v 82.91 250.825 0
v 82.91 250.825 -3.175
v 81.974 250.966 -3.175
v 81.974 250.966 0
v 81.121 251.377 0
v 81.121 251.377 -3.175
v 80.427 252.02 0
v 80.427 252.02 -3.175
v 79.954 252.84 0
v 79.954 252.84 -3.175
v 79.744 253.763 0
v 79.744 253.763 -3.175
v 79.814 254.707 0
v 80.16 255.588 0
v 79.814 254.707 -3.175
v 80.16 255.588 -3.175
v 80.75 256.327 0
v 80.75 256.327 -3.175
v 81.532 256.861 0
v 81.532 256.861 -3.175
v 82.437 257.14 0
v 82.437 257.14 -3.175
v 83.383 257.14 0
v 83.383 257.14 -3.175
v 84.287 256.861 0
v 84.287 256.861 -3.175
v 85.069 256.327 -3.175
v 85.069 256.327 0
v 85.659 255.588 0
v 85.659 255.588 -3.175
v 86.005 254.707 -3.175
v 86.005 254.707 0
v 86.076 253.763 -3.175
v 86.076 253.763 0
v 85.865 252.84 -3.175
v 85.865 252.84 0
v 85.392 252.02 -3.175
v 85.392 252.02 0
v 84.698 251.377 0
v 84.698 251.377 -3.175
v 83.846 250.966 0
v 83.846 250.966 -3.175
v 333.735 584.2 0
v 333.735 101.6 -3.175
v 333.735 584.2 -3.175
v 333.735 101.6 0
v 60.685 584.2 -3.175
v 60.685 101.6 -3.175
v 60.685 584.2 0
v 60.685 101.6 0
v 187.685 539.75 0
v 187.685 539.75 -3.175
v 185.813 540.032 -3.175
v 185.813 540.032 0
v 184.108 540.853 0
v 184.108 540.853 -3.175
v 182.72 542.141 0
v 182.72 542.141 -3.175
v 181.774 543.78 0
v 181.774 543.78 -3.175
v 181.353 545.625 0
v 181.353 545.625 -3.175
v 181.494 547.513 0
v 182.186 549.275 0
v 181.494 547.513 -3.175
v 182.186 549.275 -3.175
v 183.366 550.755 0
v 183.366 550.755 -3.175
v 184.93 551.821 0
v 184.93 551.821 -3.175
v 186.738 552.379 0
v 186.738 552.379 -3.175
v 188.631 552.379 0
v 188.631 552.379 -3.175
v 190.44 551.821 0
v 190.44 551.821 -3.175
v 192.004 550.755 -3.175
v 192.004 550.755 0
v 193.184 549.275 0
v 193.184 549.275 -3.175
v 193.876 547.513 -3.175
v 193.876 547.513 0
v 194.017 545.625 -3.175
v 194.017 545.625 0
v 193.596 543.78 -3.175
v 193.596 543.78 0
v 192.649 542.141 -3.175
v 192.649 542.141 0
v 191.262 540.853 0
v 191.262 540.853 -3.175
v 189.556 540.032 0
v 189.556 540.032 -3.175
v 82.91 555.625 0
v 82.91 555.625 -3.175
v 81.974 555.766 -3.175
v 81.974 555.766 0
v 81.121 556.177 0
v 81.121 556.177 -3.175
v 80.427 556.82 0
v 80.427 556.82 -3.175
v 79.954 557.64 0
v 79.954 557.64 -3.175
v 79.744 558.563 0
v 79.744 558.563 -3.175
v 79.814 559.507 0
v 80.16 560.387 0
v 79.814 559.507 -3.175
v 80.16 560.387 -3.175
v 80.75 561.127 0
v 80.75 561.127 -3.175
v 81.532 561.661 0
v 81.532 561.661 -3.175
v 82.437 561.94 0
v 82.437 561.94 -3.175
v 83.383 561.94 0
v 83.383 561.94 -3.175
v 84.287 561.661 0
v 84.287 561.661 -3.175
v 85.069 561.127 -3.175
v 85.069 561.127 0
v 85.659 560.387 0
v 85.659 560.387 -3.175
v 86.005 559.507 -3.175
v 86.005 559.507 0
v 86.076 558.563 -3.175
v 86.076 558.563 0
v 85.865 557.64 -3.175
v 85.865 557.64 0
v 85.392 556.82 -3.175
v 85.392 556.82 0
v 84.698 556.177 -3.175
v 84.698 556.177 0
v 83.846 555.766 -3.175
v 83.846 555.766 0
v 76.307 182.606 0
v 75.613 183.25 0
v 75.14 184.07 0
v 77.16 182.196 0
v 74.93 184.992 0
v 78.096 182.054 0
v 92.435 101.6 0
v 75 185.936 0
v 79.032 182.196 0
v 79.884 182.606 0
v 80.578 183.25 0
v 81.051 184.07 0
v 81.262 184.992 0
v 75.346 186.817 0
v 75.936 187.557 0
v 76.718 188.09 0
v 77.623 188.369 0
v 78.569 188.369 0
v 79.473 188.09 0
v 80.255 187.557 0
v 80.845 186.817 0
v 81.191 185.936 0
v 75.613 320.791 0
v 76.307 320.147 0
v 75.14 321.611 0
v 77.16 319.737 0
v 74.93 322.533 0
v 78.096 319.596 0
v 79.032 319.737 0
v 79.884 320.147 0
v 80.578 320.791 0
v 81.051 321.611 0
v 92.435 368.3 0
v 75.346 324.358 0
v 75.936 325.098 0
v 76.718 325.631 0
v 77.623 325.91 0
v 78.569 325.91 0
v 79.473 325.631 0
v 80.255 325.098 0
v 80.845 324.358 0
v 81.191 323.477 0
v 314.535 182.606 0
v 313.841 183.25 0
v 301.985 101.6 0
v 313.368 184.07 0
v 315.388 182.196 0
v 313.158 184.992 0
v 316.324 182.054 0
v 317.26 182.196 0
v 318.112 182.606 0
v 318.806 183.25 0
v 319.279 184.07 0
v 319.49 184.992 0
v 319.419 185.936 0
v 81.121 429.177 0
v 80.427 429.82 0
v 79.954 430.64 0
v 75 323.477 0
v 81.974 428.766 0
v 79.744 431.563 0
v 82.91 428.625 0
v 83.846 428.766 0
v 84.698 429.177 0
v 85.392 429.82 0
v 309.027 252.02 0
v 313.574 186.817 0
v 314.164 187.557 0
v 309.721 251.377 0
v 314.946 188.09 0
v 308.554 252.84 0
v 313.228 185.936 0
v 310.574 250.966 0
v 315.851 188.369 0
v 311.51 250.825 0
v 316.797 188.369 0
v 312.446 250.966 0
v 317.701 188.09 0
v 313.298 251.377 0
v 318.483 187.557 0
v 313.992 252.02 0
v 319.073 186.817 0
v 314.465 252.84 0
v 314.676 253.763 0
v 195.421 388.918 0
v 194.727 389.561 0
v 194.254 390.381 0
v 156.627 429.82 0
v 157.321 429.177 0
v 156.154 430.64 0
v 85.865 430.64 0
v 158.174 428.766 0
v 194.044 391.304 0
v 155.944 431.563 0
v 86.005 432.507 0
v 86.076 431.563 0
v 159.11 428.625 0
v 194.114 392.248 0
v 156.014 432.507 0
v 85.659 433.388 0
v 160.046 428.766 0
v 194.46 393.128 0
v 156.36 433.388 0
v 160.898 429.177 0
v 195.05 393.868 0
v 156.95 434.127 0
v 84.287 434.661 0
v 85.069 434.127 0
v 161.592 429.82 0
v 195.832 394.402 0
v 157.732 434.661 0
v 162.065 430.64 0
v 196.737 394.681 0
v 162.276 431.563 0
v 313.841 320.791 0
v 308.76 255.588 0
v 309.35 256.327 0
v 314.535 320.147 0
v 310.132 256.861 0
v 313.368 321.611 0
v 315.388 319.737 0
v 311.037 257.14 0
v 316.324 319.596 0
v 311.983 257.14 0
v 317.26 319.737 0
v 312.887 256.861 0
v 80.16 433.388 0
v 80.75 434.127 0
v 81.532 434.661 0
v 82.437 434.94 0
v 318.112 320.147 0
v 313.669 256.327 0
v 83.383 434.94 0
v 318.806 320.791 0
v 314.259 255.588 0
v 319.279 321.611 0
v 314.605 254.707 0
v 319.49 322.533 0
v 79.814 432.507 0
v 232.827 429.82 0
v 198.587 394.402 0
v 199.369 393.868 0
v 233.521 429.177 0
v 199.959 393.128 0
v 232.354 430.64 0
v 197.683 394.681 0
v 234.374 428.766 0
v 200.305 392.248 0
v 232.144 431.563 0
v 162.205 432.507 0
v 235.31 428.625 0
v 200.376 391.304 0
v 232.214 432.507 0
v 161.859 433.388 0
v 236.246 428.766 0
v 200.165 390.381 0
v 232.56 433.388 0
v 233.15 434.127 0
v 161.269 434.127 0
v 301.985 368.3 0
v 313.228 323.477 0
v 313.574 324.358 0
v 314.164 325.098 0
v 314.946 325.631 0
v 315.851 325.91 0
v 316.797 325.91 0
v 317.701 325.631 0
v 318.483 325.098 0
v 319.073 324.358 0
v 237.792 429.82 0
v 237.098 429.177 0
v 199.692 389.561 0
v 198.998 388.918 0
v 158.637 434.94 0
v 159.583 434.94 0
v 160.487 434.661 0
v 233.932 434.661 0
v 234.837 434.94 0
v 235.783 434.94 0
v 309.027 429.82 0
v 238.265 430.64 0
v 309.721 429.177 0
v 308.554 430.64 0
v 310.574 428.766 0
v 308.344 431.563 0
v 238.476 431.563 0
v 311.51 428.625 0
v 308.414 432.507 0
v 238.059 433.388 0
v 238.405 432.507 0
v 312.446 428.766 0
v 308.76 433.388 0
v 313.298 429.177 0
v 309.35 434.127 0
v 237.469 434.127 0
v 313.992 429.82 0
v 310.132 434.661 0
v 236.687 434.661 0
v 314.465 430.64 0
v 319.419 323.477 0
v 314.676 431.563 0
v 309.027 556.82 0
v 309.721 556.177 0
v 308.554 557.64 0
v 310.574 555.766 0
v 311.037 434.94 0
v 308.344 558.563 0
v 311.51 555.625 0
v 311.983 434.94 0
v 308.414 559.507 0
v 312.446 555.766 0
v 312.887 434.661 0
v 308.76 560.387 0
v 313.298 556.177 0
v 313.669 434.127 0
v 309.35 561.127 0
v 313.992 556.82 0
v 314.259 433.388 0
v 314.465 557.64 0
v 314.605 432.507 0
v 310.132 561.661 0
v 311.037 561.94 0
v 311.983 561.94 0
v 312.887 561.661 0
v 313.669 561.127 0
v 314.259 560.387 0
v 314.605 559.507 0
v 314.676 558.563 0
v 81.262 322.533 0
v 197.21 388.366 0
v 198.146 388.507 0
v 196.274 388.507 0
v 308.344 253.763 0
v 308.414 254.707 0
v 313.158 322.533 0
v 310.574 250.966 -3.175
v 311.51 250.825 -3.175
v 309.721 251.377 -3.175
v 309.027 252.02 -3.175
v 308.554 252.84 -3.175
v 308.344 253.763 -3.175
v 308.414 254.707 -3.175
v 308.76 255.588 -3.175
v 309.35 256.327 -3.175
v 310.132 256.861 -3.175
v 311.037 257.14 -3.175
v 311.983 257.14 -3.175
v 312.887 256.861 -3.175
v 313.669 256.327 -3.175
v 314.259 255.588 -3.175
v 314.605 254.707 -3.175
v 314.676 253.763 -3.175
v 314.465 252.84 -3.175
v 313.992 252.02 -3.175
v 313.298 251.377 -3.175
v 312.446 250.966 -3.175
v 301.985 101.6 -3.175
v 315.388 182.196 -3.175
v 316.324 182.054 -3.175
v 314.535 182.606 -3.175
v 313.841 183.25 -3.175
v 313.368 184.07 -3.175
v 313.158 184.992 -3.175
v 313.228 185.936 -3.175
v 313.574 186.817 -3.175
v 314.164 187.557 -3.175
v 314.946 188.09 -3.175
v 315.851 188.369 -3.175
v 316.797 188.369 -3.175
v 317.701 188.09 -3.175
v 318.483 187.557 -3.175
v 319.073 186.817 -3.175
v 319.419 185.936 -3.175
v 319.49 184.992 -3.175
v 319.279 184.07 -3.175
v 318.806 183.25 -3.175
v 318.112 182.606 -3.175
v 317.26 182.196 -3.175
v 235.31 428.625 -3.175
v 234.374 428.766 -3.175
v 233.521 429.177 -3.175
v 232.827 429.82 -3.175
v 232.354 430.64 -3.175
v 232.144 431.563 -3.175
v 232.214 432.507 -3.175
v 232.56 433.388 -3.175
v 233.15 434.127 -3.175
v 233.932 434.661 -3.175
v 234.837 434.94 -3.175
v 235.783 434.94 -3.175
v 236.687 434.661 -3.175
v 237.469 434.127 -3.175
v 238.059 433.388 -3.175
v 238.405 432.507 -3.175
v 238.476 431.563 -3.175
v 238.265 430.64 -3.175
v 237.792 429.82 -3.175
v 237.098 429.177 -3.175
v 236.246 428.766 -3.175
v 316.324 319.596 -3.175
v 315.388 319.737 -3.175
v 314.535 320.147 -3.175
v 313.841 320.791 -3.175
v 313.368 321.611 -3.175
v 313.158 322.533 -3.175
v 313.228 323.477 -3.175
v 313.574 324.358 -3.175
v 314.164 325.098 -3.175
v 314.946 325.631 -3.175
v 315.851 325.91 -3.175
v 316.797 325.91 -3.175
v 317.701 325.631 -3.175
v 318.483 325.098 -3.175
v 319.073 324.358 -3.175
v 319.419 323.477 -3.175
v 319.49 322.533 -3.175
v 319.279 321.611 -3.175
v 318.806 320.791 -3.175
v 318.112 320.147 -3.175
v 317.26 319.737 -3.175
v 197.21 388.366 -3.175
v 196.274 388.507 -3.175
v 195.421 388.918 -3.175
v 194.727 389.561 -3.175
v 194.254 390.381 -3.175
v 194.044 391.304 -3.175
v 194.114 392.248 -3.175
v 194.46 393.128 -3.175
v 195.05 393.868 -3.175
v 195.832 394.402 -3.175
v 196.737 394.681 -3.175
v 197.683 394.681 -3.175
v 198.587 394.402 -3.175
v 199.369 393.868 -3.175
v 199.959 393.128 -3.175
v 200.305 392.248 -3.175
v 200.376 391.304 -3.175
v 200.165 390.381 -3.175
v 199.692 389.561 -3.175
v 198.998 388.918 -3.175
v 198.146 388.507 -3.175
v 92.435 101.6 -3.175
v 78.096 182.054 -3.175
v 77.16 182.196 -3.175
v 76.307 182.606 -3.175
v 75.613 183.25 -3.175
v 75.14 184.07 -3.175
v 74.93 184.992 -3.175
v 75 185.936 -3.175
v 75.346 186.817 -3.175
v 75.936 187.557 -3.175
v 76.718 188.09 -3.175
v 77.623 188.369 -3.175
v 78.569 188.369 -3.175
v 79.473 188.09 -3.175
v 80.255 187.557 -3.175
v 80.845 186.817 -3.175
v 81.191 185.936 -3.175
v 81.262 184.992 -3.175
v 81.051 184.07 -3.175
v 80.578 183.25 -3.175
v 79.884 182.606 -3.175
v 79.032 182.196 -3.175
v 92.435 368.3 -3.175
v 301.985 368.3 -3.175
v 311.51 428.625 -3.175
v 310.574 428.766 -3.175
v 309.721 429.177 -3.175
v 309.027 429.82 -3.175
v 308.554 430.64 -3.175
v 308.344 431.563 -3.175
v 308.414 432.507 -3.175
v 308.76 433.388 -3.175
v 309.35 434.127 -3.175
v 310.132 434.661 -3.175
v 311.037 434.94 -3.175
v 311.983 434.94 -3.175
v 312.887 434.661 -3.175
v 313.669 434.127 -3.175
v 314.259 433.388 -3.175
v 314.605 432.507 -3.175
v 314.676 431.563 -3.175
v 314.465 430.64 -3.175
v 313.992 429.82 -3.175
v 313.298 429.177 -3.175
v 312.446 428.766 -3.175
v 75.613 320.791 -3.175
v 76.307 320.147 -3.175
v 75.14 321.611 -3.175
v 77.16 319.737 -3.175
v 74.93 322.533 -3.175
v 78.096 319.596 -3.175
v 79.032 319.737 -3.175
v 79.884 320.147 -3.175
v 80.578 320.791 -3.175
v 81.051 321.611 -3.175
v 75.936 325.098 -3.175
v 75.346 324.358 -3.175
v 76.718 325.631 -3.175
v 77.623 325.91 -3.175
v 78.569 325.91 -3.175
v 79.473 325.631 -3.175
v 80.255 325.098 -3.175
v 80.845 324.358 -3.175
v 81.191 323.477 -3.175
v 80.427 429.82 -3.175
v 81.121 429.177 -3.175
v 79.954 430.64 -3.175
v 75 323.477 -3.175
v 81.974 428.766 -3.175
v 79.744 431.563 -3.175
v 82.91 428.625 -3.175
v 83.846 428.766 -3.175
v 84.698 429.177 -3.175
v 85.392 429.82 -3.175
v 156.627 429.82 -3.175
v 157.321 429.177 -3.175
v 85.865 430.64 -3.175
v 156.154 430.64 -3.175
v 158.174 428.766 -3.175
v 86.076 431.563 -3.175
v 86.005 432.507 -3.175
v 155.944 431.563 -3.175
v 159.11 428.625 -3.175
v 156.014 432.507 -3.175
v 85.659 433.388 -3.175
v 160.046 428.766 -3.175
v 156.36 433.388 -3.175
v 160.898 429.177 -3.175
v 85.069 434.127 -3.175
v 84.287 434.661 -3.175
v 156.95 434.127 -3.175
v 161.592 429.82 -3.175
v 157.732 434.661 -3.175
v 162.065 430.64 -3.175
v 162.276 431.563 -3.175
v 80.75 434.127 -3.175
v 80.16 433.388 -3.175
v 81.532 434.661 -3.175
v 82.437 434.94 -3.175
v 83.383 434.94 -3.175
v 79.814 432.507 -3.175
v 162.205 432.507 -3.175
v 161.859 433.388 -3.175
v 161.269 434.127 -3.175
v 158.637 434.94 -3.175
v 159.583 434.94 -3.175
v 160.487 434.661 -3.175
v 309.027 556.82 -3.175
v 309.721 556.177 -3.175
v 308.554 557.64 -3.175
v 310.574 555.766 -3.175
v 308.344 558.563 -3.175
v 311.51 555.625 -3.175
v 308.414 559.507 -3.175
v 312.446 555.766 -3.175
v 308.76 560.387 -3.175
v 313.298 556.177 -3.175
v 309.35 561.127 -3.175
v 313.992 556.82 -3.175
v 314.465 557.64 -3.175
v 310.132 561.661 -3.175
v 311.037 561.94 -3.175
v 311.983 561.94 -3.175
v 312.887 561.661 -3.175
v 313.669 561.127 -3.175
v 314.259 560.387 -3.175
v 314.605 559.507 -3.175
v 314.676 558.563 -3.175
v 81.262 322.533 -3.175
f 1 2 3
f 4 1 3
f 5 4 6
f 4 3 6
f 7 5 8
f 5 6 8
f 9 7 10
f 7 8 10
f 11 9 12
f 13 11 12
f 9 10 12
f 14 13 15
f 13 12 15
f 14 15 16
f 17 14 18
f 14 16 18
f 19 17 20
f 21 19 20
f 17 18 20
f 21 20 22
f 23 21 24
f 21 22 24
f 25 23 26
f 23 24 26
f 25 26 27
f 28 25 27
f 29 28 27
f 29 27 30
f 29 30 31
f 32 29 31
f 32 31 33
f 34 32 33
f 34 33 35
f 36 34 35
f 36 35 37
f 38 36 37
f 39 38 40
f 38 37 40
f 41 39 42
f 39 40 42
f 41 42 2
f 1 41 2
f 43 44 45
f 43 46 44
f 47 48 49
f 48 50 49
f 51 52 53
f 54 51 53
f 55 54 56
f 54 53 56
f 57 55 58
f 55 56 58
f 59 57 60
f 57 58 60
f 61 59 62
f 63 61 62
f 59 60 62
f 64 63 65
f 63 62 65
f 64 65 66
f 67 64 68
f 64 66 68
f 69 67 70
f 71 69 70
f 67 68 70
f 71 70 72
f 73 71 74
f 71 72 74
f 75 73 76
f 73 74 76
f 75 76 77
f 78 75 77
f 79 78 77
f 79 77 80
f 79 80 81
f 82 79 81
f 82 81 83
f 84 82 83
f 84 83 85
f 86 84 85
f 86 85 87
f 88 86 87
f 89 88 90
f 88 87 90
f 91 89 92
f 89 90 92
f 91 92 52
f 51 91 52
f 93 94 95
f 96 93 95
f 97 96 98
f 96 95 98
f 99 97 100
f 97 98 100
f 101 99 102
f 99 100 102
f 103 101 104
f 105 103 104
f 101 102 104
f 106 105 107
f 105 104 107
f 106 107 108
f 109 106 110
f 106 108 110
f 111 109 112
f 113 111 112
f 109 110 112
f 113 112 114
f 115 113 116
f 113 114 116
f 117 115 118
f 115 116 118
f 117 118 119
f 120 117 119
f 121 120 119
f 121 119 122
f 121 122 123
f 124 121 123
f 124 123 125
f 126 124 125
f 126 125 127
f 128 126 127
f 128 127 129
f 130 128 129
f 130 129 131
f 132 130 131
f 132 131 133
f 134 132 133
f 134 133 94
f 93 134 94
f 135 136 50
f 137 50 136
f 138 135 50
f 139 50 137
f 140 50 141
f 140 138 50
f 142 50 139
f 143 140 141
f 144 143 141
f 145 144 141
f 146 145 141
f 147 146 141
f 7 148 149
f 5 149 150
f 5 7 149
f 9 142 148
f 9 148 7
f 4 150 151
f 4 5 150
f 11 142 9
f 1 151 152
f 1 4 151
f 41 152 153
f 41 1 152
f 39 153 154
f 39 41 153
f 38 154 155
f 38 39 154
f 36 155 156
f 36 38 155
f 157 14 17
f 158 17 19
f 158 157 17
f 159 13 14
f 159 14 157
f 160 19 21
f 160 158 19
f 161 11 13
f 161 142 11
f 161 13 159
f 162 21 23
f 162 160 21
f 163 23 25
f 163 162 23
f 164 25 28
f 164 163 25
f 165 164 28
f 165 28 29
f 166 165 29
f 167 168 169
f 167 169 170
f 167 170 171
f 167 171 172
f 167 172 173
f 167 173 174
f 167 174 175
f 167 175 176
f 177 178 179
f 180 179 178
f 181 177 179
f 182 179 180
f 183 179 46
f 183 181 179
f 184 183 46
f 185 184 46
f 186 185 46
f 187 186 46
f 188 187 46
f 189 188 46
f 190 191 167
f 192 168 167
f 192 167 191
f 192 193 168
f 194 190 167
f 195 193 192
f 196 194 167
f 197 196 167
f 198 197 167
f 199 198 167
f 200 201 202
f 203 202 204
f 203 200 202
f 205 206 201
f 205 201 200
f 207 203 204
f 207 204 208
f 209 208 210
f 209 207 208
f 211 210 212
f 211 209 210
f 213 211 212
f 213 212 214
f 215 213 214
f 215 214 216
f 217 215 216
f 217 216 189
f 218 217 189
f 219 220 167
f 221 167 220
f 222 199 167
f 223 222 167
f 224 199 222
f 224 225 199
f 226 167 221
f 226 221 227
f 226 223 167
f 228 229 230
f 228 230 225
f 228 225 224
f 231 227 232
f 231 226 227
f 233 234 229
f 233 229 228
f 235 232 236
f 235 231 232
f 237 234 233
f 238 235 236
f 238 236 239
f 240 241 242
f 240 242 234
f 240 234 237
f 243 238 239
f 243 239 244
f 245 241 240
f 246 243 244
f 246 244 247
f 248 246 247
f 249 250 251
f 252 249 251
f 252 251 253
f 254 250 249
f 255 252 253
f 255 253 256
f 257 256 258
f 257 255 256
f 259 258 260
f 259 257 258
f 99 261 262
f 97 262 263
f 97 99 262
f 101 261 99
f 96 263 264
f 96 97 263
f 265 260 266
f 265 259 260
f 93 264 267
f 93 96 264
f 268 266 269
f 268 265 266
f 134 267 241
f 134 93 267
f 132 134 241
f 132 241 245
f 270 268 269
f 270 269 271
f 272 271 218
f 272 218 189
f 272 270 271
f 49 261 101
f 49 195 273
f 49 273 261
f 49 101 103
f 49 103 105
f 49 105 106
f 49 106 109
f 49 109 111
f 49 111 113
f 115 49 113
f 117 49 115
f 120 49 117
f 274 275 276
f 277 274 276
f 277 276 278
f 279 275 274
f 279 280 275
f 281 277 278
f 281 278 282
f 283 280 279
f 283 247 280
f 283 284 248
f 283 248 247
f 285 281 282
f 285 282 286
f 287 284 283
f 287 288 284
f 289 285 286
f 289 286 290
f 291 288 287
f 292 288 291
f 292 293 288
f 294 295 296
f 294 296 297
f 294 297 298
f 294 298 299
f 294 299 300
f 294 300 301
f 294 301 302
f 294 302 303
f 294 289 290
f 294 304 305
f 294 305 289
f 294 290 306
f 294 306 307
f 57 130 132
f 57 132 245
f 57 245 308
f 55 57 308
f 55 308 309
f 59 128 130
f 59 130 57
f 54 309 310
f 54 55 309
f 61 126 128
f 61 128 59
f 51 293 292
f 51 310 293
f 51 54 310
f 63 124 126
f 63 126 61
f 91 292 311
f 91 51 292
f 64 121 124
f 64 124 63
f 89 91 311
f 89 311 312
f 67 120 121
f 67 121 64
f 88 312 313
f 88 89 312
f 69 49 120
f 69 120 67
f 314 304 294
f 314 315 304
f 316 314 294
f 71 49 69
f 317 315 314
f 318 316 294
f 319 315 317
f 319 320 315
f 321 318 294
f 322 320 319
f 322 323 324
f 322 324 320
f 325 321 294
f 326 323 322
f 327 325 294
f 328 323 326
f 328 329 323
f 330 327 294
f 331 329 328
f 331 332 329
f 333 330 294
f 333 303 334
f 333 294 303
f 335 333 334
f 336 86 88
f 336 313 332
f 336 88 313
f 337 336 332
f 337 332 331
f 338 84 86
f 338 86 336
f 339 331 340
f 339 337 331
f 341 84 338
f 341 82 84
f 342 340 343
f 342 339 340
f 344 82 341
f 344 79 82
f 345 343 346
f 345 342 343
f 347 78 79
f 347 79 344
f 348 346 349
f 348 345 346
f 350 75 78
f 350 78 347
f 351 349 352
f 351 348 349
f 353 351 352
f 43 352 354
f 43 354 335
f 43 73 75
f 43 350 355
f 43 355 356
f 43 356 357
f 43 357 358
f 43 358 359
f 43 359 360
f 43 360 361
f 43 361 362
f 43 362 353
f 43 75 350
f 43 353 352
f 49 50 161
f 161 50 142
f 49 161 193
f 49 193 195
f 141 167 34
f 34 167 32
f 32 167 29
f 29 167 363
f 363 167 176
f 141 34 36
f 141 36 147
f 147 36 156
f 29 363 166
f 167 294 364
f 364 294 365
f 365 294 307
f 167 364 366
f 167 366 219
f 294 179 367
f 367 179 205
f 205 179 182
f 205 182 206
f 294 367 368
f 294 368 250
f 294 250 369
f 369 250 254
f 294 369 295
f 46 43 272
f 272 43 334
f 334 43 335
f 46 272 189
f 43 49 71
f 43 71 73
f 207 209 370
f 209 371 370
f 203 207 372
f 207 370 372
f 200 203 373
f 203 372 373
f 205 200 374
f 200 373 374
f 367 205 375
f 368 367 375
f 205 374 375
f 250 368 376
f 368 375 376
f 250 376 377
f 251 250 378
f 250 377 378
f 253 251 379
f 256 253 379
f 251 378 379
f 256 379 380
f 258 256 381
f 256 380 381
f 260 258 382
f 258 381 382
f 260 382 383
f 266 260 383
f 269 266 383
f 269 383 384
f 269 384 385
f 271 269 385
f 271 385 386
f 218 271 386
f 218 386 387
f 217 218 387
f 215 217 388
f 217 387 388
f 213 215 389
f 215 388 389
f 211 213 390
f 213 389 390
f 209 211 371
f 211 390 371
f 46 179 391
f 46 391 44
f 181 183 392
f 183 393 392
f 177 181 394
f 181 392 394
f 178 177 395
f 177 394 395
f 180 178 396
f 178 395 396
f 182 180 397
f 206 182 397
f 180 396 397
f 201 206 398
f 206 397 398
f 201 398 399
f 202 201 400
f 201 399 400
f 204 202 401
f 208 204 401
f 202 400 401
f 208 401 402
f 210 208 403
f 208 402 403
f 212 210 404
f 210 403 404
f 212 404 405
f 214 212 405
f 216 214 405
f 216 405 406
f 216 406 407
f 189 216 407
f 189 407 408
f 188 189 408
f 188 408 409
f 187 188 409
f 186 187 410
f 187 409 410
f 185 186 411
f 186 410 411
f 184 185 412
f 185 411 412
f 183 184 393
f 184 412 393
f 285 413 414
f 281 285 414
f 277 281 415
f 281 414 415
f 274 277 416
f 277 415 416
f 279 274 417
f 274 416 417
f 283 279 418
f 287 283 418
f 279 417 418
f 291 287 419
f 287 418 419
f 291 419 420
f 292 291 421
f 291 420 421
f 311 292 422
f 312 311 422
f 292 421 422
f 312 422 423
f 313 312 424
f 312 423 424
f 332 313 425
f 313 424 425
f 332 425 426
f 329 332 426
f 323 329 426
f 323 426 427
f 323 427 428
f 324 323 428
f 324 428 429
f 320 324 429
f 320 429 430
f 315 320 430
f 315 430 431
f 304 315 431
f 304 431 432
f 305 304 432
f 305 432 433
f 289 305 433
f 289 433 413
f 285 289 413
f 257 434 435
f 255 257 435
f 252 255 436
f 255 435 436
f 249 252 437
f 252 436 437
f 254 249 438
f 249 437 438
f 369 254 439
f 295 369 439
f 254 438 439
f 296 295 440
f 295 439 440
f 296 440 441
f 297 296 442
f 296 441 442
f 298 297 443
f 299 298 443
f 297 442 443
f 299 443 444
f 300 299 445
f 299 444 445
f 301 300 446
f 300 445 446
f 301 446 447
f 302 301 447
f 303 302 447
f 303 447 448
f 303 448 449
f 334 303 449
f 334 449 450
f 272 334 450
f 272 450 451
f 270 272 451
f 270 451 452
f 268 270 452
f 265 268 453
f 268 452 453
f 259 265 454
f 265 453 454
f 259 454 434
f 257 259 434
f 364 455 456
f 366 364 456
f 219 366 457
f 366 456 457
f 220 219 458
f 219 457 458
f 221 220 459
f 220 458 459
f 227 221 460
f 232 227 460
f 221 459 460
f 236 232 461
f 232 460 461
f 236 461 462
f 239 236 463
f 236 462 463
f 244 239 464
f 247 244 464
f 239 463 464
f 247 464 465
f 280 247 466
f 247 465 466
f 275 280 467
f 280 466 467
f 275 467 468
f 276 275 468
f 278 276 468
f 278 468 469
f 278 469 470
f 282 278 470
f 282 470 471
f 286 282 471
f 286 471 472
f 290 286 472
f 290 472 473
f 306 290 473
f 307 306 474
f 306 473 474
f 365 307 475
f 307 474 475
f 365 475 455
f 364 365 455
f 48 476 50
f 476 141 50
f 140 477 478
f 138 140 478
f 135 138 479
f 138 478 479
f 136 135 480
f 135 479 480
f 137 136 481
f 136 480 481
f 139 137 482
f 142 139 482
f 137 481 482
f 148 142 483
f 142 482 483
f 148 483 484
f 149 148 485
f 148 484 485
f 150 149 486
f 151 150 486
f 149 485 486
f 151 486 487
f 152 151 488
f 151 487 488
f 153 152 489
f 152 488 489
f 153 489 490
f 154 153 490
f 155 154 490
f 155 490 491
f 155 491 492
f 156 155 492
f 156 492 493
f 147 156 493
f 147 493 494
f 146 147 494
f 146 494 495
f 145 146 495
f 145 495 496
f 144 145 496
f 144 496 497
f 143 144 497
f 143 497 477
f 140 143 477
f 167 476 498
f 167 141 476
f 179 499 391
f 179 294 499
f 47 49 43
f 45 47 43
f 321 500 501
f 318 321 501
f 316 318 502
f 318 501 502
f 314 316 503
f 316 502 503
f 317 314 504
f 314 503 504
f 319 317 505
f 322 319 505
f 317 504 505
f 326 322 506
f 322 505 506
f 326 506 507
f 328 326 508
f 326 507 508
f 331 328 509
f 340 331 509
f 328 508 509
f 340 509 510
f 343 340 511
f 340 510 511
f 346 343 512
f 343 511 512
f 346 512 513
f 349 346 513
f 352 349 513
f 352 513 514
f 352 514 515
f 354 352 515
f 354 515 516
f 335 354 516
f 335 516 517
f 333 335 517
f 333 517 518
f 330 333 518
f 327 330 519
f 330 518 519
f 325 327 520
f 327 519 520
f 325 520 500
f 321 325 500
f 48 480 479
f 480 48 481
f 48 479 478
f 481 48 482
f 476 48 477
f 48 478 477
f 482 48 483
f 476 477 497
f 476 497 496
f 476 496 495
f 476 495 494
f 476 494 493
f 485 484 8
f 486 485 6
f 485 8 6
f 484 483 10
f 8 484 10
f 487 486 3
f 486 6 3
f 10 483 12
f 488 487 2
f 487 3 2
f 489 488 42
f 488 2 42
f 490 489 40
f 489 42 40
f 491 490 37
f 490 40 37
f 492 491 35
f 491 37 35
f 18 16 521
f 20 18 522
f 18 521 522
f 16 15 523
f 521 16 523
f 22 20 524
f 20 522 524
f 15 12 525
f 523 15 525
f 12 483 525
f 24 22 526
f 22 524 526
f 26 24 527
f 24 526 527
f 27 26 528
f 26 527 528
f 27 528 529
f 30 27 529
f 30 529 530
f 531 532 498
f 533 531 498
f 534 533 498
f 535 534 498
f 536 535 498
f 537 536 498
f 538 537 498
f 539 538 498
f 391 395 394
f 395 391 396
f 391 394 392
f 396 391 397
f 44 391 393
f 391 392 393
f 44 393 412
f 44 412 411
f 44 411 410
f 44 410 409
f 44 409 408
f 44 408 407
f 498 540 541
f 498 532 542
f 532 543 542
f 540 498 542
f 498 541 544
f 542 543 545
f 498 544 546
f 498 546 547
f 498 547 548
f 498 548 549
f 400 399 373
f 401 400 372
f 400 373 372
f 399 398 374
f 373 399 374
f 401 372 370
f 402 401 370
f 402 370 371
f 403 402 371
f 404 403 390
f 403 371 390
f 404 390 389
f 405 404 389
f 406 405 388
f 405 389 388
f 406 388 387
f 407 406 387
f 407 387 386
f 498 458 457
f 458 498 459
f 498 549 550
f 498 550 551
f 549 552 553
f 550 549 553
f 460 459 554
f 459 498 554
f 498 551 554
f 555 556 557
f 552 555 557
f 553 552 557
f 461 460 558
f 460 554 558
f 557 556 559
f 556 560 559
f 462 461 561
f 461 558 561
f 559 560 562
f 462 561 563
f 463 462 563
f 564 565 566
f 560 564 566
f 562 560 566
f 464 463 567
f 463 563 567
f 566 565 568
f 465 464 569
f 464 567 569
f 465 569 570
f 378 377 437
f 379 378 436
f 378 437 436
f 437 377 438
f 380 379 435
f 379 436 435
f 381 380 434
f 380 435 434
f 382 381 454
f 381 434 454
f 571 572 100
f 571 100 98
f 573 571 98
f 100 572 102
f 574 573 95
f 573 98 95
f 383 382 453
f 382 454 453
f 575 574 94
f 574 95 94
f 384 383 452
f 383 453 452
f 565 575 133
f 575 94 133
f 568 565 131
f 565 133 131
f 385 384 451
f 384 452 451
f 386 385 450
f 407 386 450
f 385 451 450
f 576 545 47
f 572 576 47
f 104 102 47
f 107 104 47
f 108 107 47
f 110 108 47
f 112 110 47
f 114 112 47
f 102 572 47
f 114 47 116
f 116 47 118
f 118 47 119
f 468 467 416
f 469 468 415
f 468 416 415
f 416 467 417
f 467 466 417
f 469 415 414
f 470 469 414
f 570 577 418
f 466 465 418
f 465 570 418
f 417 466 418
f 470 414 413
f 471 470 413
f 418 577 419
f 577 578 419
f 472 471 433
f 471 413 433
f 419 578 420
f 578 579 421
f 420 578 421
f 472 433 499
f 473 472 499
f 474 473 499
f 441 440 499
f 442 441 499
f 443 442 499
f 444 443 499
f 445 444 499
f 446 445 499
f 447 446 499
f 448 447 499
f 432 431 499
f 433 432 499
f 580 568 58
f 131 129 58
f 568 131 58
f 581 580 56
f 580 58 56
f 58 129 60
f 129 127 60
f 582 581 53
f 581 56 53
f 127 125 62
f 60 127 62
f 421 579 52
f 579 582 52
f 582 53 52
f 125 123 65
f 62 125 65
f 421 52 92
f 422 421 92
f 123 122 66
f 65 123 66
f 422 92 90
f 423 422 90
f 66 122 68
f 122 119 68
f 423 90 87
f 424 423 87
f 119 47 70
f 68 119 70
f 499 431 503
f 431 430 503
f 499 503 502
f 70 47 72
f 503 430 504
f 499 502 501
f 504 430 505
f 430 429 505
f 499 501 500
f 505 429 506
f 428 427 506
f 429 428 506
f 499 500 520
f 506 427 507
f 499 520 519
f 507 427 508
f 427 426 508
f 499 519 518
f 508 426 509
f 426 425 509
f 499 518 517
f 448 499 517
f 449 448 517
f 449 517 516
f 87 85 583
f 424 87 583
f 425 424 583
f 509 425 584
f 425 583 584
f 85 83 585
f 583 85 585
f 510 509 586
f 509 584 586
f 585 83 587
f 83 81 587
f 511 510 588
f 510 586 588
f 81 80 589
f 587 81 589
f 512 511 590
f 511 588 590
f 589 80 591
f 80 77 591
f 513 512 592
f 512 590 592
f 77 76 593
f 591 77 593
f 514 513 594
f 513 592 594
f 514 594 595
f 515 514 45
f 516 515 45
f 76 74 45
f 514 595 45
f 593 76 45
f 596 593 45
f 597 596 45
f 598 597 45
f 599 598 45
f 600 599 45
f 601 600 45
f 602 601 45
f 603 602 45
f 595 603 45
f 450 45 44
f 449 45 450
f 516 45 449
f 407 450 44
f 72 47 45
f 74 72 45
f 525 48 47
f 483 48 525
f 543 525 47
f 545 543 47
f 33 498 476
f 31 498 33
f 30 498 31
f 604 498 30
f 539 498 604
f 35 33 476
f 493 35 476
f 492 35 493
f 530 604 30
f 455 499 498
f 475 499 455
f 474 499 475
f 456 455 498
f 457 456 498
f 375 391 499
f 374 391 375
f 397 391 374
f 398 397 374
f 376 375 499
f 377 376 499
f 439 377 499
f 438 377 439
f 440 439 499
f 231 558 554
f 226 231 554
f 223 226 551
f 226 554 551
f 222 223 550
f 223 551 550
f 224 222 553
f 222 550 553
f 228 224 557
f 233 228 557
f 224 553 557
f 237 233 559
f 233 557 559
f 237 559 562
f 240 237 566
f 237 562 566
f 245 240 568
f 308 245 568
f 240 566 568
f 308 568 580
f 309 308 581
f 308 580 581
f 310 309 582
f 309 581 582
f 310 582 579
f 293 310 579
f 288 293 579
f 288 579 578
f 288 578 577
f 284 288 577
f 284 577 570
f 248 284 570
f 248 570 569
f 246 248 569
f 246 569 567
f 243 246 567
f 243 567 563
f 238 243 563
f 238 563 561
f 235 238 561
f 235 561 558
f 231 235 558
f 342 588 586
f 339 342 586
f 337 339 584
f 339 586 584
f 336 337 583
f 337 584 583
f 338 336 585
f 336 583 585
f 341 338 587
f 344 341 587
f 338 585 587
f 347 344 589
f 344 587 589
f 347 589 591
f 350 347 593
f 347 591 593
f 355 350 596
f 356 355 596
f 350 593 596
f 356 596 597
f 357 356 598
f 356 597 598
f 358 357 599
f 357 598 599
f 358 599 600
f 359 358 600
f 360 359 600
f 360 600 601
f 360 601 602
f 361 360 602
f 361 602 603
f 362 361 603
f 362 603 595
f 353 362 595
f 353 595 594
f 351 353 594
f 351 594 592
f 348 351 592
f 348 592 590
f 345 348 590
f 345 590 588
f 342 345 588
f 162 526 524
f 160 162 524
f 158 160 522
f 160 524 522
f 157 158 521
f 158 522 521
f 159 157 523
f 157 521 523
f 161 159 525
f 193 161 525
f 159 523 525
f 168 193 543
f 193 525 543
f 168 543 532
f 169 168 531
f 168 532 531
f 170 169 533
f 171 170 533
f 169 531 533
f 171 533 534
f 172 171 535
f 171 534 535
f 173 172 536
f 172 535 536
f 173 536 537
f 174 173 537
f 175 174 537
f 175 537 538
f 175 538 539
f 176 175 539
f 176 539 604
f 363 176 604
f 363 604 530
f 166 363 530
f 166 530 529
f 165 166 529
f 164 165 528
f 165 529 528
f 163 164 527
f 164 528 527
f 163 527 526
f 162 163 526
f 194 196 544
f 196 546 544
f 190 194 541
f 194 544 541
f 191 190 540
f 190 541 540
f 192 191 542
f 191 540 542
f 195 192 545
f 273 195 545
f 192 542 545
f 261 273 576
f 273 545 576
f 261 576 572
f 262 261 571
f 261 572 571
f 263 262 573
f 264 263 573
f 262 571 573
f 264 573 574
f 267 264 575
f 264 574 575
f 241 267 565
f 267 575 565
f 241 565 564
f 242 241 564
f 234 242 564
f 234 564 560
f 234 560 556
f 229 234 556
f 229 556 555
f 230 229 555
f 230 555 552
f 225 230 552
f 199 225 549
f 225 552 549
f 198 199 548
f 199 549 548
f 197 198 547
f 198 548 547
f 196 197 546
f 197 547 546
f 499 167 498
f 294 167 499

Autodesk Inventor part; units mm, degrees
ref_plane "YZ Plane" through (0, 0, 0) normal (1, 0, 0) x (0, 1, 0)
ref_plane "XZ Plane" through (0, 0, 0) normal (0, 1, 0) x (-1, 0, 0)
ref_plane "XY Plane" through (0, 0, 0) normal (0, 0, 1) x (1, 0, 0)
sketch "Sketch1" plane through (0, 0, 0) normal (0, 0, 1) x (1, 0, 0)
  line L0 (333.7348, 101.6) -> (333.7348, 584.2)
  line L1 (92.4348, 101.6) -> (92.4348, 368.3)
  line L2 (92.4348, 368.3) -> (301.9848, 368.3)
  line L3 (301.9848, 368.3) -> (301.9848, 101.6)
  line L4 (301.9848, 101.6) -> (333.7348, 101.6)
  line L5 (92.4348, 101.6) -> (60.6848, 101.6)
  line L6 (60.6848, 101.6) -> (60.6848, 584.2)
  line L7 (60.6848, 584.2) -> (333.7348, 584.2)
  point P0 (0, 0)
  point P1 (197.2098, 254)
  point P2 (197.2098, 391.541)
  point P3 (78.0958, 322.7705)
  point P4 (78.0958, 185.2295)
  point P5 (197.2098, 116.459)
  point P6 (316.3238, 185.2295)
  point P7 (316.3238, 322.7705)
  point P8 (187.6848, 546.1)
  point P9 (311.5098, 254)
  point P10 (311.5098, 558.8)
  point P11 (311.5098, 431.8)
  point P12 (82.9098, 558.8)
  point P13 (82.9098, 431.8)
  point P14 (82.9098, 254)
  point P15 (235.3098, 431.8)
  point P16 (159.1098, 431.8)
  dimension "d1" = 482.6
  dimension "d4" = 137.541
  dimension "d7" = 360
  dimension "d9" = 31.75
  dimension "d21" = 31.75
  dimension "d23" = 114.3
  dimension "d24" = 38.1
  dimension "d33" = 273.05
  dimension "d34" = 146.05
  dimension "d35" = 25.4
  dimension "d36" = 25.4
  dimension "d39" = 177.8
  dimension "d40" = 177.8
  dimension "d48" = 22.225
  dimension "d49" = 22.225
  dimension "d51" = 76.2
  dimension "d52" = 76.2
  dimension "d53" = 76.2
  dimension "d54" = 209.55
  dimension "d55" = 266.7
  dimension "d56" = 104.775
  dimension "d57" = 152.4
  dimension "d58" = 152.4
extrude "Extrusion1" add sketch "Sketch1" against normal blind 3.175
hole "Hole1" at (197.2098, 254, 0) at (197.2098, 391.541, 0) at (78.0958, 322.7705, 0) at (78.0958, 185.2295, 0) at (197.2098, 116.459, 0) at (316.3238, 185.2295, 0) at (316.3238, 322.7705, 0) direction (0, 0, -1) diameter 6.35 depth 25.4 tip angle 118
hole "Hole2" at (187.6848, 546.1, 0) direction (0, 0, -1) diameter 12.7 depth 25.4 tip angle 118
hole "Hole3" at (311.5098, 254, 0) at (311.5098, 558.8, 0) at (311.5098, 431.8, 0) at (82.9098, 558.8, 0) at (82.9098, 431.8, 0) at (82.9098, 254, 0) at (159.1098, 431.8, 0) at (235.3098, 431.8, 0) direction (0, 0, -1) diameter 6.35 depth 25.4 tip angle 118
properties part number "bottom plate"
